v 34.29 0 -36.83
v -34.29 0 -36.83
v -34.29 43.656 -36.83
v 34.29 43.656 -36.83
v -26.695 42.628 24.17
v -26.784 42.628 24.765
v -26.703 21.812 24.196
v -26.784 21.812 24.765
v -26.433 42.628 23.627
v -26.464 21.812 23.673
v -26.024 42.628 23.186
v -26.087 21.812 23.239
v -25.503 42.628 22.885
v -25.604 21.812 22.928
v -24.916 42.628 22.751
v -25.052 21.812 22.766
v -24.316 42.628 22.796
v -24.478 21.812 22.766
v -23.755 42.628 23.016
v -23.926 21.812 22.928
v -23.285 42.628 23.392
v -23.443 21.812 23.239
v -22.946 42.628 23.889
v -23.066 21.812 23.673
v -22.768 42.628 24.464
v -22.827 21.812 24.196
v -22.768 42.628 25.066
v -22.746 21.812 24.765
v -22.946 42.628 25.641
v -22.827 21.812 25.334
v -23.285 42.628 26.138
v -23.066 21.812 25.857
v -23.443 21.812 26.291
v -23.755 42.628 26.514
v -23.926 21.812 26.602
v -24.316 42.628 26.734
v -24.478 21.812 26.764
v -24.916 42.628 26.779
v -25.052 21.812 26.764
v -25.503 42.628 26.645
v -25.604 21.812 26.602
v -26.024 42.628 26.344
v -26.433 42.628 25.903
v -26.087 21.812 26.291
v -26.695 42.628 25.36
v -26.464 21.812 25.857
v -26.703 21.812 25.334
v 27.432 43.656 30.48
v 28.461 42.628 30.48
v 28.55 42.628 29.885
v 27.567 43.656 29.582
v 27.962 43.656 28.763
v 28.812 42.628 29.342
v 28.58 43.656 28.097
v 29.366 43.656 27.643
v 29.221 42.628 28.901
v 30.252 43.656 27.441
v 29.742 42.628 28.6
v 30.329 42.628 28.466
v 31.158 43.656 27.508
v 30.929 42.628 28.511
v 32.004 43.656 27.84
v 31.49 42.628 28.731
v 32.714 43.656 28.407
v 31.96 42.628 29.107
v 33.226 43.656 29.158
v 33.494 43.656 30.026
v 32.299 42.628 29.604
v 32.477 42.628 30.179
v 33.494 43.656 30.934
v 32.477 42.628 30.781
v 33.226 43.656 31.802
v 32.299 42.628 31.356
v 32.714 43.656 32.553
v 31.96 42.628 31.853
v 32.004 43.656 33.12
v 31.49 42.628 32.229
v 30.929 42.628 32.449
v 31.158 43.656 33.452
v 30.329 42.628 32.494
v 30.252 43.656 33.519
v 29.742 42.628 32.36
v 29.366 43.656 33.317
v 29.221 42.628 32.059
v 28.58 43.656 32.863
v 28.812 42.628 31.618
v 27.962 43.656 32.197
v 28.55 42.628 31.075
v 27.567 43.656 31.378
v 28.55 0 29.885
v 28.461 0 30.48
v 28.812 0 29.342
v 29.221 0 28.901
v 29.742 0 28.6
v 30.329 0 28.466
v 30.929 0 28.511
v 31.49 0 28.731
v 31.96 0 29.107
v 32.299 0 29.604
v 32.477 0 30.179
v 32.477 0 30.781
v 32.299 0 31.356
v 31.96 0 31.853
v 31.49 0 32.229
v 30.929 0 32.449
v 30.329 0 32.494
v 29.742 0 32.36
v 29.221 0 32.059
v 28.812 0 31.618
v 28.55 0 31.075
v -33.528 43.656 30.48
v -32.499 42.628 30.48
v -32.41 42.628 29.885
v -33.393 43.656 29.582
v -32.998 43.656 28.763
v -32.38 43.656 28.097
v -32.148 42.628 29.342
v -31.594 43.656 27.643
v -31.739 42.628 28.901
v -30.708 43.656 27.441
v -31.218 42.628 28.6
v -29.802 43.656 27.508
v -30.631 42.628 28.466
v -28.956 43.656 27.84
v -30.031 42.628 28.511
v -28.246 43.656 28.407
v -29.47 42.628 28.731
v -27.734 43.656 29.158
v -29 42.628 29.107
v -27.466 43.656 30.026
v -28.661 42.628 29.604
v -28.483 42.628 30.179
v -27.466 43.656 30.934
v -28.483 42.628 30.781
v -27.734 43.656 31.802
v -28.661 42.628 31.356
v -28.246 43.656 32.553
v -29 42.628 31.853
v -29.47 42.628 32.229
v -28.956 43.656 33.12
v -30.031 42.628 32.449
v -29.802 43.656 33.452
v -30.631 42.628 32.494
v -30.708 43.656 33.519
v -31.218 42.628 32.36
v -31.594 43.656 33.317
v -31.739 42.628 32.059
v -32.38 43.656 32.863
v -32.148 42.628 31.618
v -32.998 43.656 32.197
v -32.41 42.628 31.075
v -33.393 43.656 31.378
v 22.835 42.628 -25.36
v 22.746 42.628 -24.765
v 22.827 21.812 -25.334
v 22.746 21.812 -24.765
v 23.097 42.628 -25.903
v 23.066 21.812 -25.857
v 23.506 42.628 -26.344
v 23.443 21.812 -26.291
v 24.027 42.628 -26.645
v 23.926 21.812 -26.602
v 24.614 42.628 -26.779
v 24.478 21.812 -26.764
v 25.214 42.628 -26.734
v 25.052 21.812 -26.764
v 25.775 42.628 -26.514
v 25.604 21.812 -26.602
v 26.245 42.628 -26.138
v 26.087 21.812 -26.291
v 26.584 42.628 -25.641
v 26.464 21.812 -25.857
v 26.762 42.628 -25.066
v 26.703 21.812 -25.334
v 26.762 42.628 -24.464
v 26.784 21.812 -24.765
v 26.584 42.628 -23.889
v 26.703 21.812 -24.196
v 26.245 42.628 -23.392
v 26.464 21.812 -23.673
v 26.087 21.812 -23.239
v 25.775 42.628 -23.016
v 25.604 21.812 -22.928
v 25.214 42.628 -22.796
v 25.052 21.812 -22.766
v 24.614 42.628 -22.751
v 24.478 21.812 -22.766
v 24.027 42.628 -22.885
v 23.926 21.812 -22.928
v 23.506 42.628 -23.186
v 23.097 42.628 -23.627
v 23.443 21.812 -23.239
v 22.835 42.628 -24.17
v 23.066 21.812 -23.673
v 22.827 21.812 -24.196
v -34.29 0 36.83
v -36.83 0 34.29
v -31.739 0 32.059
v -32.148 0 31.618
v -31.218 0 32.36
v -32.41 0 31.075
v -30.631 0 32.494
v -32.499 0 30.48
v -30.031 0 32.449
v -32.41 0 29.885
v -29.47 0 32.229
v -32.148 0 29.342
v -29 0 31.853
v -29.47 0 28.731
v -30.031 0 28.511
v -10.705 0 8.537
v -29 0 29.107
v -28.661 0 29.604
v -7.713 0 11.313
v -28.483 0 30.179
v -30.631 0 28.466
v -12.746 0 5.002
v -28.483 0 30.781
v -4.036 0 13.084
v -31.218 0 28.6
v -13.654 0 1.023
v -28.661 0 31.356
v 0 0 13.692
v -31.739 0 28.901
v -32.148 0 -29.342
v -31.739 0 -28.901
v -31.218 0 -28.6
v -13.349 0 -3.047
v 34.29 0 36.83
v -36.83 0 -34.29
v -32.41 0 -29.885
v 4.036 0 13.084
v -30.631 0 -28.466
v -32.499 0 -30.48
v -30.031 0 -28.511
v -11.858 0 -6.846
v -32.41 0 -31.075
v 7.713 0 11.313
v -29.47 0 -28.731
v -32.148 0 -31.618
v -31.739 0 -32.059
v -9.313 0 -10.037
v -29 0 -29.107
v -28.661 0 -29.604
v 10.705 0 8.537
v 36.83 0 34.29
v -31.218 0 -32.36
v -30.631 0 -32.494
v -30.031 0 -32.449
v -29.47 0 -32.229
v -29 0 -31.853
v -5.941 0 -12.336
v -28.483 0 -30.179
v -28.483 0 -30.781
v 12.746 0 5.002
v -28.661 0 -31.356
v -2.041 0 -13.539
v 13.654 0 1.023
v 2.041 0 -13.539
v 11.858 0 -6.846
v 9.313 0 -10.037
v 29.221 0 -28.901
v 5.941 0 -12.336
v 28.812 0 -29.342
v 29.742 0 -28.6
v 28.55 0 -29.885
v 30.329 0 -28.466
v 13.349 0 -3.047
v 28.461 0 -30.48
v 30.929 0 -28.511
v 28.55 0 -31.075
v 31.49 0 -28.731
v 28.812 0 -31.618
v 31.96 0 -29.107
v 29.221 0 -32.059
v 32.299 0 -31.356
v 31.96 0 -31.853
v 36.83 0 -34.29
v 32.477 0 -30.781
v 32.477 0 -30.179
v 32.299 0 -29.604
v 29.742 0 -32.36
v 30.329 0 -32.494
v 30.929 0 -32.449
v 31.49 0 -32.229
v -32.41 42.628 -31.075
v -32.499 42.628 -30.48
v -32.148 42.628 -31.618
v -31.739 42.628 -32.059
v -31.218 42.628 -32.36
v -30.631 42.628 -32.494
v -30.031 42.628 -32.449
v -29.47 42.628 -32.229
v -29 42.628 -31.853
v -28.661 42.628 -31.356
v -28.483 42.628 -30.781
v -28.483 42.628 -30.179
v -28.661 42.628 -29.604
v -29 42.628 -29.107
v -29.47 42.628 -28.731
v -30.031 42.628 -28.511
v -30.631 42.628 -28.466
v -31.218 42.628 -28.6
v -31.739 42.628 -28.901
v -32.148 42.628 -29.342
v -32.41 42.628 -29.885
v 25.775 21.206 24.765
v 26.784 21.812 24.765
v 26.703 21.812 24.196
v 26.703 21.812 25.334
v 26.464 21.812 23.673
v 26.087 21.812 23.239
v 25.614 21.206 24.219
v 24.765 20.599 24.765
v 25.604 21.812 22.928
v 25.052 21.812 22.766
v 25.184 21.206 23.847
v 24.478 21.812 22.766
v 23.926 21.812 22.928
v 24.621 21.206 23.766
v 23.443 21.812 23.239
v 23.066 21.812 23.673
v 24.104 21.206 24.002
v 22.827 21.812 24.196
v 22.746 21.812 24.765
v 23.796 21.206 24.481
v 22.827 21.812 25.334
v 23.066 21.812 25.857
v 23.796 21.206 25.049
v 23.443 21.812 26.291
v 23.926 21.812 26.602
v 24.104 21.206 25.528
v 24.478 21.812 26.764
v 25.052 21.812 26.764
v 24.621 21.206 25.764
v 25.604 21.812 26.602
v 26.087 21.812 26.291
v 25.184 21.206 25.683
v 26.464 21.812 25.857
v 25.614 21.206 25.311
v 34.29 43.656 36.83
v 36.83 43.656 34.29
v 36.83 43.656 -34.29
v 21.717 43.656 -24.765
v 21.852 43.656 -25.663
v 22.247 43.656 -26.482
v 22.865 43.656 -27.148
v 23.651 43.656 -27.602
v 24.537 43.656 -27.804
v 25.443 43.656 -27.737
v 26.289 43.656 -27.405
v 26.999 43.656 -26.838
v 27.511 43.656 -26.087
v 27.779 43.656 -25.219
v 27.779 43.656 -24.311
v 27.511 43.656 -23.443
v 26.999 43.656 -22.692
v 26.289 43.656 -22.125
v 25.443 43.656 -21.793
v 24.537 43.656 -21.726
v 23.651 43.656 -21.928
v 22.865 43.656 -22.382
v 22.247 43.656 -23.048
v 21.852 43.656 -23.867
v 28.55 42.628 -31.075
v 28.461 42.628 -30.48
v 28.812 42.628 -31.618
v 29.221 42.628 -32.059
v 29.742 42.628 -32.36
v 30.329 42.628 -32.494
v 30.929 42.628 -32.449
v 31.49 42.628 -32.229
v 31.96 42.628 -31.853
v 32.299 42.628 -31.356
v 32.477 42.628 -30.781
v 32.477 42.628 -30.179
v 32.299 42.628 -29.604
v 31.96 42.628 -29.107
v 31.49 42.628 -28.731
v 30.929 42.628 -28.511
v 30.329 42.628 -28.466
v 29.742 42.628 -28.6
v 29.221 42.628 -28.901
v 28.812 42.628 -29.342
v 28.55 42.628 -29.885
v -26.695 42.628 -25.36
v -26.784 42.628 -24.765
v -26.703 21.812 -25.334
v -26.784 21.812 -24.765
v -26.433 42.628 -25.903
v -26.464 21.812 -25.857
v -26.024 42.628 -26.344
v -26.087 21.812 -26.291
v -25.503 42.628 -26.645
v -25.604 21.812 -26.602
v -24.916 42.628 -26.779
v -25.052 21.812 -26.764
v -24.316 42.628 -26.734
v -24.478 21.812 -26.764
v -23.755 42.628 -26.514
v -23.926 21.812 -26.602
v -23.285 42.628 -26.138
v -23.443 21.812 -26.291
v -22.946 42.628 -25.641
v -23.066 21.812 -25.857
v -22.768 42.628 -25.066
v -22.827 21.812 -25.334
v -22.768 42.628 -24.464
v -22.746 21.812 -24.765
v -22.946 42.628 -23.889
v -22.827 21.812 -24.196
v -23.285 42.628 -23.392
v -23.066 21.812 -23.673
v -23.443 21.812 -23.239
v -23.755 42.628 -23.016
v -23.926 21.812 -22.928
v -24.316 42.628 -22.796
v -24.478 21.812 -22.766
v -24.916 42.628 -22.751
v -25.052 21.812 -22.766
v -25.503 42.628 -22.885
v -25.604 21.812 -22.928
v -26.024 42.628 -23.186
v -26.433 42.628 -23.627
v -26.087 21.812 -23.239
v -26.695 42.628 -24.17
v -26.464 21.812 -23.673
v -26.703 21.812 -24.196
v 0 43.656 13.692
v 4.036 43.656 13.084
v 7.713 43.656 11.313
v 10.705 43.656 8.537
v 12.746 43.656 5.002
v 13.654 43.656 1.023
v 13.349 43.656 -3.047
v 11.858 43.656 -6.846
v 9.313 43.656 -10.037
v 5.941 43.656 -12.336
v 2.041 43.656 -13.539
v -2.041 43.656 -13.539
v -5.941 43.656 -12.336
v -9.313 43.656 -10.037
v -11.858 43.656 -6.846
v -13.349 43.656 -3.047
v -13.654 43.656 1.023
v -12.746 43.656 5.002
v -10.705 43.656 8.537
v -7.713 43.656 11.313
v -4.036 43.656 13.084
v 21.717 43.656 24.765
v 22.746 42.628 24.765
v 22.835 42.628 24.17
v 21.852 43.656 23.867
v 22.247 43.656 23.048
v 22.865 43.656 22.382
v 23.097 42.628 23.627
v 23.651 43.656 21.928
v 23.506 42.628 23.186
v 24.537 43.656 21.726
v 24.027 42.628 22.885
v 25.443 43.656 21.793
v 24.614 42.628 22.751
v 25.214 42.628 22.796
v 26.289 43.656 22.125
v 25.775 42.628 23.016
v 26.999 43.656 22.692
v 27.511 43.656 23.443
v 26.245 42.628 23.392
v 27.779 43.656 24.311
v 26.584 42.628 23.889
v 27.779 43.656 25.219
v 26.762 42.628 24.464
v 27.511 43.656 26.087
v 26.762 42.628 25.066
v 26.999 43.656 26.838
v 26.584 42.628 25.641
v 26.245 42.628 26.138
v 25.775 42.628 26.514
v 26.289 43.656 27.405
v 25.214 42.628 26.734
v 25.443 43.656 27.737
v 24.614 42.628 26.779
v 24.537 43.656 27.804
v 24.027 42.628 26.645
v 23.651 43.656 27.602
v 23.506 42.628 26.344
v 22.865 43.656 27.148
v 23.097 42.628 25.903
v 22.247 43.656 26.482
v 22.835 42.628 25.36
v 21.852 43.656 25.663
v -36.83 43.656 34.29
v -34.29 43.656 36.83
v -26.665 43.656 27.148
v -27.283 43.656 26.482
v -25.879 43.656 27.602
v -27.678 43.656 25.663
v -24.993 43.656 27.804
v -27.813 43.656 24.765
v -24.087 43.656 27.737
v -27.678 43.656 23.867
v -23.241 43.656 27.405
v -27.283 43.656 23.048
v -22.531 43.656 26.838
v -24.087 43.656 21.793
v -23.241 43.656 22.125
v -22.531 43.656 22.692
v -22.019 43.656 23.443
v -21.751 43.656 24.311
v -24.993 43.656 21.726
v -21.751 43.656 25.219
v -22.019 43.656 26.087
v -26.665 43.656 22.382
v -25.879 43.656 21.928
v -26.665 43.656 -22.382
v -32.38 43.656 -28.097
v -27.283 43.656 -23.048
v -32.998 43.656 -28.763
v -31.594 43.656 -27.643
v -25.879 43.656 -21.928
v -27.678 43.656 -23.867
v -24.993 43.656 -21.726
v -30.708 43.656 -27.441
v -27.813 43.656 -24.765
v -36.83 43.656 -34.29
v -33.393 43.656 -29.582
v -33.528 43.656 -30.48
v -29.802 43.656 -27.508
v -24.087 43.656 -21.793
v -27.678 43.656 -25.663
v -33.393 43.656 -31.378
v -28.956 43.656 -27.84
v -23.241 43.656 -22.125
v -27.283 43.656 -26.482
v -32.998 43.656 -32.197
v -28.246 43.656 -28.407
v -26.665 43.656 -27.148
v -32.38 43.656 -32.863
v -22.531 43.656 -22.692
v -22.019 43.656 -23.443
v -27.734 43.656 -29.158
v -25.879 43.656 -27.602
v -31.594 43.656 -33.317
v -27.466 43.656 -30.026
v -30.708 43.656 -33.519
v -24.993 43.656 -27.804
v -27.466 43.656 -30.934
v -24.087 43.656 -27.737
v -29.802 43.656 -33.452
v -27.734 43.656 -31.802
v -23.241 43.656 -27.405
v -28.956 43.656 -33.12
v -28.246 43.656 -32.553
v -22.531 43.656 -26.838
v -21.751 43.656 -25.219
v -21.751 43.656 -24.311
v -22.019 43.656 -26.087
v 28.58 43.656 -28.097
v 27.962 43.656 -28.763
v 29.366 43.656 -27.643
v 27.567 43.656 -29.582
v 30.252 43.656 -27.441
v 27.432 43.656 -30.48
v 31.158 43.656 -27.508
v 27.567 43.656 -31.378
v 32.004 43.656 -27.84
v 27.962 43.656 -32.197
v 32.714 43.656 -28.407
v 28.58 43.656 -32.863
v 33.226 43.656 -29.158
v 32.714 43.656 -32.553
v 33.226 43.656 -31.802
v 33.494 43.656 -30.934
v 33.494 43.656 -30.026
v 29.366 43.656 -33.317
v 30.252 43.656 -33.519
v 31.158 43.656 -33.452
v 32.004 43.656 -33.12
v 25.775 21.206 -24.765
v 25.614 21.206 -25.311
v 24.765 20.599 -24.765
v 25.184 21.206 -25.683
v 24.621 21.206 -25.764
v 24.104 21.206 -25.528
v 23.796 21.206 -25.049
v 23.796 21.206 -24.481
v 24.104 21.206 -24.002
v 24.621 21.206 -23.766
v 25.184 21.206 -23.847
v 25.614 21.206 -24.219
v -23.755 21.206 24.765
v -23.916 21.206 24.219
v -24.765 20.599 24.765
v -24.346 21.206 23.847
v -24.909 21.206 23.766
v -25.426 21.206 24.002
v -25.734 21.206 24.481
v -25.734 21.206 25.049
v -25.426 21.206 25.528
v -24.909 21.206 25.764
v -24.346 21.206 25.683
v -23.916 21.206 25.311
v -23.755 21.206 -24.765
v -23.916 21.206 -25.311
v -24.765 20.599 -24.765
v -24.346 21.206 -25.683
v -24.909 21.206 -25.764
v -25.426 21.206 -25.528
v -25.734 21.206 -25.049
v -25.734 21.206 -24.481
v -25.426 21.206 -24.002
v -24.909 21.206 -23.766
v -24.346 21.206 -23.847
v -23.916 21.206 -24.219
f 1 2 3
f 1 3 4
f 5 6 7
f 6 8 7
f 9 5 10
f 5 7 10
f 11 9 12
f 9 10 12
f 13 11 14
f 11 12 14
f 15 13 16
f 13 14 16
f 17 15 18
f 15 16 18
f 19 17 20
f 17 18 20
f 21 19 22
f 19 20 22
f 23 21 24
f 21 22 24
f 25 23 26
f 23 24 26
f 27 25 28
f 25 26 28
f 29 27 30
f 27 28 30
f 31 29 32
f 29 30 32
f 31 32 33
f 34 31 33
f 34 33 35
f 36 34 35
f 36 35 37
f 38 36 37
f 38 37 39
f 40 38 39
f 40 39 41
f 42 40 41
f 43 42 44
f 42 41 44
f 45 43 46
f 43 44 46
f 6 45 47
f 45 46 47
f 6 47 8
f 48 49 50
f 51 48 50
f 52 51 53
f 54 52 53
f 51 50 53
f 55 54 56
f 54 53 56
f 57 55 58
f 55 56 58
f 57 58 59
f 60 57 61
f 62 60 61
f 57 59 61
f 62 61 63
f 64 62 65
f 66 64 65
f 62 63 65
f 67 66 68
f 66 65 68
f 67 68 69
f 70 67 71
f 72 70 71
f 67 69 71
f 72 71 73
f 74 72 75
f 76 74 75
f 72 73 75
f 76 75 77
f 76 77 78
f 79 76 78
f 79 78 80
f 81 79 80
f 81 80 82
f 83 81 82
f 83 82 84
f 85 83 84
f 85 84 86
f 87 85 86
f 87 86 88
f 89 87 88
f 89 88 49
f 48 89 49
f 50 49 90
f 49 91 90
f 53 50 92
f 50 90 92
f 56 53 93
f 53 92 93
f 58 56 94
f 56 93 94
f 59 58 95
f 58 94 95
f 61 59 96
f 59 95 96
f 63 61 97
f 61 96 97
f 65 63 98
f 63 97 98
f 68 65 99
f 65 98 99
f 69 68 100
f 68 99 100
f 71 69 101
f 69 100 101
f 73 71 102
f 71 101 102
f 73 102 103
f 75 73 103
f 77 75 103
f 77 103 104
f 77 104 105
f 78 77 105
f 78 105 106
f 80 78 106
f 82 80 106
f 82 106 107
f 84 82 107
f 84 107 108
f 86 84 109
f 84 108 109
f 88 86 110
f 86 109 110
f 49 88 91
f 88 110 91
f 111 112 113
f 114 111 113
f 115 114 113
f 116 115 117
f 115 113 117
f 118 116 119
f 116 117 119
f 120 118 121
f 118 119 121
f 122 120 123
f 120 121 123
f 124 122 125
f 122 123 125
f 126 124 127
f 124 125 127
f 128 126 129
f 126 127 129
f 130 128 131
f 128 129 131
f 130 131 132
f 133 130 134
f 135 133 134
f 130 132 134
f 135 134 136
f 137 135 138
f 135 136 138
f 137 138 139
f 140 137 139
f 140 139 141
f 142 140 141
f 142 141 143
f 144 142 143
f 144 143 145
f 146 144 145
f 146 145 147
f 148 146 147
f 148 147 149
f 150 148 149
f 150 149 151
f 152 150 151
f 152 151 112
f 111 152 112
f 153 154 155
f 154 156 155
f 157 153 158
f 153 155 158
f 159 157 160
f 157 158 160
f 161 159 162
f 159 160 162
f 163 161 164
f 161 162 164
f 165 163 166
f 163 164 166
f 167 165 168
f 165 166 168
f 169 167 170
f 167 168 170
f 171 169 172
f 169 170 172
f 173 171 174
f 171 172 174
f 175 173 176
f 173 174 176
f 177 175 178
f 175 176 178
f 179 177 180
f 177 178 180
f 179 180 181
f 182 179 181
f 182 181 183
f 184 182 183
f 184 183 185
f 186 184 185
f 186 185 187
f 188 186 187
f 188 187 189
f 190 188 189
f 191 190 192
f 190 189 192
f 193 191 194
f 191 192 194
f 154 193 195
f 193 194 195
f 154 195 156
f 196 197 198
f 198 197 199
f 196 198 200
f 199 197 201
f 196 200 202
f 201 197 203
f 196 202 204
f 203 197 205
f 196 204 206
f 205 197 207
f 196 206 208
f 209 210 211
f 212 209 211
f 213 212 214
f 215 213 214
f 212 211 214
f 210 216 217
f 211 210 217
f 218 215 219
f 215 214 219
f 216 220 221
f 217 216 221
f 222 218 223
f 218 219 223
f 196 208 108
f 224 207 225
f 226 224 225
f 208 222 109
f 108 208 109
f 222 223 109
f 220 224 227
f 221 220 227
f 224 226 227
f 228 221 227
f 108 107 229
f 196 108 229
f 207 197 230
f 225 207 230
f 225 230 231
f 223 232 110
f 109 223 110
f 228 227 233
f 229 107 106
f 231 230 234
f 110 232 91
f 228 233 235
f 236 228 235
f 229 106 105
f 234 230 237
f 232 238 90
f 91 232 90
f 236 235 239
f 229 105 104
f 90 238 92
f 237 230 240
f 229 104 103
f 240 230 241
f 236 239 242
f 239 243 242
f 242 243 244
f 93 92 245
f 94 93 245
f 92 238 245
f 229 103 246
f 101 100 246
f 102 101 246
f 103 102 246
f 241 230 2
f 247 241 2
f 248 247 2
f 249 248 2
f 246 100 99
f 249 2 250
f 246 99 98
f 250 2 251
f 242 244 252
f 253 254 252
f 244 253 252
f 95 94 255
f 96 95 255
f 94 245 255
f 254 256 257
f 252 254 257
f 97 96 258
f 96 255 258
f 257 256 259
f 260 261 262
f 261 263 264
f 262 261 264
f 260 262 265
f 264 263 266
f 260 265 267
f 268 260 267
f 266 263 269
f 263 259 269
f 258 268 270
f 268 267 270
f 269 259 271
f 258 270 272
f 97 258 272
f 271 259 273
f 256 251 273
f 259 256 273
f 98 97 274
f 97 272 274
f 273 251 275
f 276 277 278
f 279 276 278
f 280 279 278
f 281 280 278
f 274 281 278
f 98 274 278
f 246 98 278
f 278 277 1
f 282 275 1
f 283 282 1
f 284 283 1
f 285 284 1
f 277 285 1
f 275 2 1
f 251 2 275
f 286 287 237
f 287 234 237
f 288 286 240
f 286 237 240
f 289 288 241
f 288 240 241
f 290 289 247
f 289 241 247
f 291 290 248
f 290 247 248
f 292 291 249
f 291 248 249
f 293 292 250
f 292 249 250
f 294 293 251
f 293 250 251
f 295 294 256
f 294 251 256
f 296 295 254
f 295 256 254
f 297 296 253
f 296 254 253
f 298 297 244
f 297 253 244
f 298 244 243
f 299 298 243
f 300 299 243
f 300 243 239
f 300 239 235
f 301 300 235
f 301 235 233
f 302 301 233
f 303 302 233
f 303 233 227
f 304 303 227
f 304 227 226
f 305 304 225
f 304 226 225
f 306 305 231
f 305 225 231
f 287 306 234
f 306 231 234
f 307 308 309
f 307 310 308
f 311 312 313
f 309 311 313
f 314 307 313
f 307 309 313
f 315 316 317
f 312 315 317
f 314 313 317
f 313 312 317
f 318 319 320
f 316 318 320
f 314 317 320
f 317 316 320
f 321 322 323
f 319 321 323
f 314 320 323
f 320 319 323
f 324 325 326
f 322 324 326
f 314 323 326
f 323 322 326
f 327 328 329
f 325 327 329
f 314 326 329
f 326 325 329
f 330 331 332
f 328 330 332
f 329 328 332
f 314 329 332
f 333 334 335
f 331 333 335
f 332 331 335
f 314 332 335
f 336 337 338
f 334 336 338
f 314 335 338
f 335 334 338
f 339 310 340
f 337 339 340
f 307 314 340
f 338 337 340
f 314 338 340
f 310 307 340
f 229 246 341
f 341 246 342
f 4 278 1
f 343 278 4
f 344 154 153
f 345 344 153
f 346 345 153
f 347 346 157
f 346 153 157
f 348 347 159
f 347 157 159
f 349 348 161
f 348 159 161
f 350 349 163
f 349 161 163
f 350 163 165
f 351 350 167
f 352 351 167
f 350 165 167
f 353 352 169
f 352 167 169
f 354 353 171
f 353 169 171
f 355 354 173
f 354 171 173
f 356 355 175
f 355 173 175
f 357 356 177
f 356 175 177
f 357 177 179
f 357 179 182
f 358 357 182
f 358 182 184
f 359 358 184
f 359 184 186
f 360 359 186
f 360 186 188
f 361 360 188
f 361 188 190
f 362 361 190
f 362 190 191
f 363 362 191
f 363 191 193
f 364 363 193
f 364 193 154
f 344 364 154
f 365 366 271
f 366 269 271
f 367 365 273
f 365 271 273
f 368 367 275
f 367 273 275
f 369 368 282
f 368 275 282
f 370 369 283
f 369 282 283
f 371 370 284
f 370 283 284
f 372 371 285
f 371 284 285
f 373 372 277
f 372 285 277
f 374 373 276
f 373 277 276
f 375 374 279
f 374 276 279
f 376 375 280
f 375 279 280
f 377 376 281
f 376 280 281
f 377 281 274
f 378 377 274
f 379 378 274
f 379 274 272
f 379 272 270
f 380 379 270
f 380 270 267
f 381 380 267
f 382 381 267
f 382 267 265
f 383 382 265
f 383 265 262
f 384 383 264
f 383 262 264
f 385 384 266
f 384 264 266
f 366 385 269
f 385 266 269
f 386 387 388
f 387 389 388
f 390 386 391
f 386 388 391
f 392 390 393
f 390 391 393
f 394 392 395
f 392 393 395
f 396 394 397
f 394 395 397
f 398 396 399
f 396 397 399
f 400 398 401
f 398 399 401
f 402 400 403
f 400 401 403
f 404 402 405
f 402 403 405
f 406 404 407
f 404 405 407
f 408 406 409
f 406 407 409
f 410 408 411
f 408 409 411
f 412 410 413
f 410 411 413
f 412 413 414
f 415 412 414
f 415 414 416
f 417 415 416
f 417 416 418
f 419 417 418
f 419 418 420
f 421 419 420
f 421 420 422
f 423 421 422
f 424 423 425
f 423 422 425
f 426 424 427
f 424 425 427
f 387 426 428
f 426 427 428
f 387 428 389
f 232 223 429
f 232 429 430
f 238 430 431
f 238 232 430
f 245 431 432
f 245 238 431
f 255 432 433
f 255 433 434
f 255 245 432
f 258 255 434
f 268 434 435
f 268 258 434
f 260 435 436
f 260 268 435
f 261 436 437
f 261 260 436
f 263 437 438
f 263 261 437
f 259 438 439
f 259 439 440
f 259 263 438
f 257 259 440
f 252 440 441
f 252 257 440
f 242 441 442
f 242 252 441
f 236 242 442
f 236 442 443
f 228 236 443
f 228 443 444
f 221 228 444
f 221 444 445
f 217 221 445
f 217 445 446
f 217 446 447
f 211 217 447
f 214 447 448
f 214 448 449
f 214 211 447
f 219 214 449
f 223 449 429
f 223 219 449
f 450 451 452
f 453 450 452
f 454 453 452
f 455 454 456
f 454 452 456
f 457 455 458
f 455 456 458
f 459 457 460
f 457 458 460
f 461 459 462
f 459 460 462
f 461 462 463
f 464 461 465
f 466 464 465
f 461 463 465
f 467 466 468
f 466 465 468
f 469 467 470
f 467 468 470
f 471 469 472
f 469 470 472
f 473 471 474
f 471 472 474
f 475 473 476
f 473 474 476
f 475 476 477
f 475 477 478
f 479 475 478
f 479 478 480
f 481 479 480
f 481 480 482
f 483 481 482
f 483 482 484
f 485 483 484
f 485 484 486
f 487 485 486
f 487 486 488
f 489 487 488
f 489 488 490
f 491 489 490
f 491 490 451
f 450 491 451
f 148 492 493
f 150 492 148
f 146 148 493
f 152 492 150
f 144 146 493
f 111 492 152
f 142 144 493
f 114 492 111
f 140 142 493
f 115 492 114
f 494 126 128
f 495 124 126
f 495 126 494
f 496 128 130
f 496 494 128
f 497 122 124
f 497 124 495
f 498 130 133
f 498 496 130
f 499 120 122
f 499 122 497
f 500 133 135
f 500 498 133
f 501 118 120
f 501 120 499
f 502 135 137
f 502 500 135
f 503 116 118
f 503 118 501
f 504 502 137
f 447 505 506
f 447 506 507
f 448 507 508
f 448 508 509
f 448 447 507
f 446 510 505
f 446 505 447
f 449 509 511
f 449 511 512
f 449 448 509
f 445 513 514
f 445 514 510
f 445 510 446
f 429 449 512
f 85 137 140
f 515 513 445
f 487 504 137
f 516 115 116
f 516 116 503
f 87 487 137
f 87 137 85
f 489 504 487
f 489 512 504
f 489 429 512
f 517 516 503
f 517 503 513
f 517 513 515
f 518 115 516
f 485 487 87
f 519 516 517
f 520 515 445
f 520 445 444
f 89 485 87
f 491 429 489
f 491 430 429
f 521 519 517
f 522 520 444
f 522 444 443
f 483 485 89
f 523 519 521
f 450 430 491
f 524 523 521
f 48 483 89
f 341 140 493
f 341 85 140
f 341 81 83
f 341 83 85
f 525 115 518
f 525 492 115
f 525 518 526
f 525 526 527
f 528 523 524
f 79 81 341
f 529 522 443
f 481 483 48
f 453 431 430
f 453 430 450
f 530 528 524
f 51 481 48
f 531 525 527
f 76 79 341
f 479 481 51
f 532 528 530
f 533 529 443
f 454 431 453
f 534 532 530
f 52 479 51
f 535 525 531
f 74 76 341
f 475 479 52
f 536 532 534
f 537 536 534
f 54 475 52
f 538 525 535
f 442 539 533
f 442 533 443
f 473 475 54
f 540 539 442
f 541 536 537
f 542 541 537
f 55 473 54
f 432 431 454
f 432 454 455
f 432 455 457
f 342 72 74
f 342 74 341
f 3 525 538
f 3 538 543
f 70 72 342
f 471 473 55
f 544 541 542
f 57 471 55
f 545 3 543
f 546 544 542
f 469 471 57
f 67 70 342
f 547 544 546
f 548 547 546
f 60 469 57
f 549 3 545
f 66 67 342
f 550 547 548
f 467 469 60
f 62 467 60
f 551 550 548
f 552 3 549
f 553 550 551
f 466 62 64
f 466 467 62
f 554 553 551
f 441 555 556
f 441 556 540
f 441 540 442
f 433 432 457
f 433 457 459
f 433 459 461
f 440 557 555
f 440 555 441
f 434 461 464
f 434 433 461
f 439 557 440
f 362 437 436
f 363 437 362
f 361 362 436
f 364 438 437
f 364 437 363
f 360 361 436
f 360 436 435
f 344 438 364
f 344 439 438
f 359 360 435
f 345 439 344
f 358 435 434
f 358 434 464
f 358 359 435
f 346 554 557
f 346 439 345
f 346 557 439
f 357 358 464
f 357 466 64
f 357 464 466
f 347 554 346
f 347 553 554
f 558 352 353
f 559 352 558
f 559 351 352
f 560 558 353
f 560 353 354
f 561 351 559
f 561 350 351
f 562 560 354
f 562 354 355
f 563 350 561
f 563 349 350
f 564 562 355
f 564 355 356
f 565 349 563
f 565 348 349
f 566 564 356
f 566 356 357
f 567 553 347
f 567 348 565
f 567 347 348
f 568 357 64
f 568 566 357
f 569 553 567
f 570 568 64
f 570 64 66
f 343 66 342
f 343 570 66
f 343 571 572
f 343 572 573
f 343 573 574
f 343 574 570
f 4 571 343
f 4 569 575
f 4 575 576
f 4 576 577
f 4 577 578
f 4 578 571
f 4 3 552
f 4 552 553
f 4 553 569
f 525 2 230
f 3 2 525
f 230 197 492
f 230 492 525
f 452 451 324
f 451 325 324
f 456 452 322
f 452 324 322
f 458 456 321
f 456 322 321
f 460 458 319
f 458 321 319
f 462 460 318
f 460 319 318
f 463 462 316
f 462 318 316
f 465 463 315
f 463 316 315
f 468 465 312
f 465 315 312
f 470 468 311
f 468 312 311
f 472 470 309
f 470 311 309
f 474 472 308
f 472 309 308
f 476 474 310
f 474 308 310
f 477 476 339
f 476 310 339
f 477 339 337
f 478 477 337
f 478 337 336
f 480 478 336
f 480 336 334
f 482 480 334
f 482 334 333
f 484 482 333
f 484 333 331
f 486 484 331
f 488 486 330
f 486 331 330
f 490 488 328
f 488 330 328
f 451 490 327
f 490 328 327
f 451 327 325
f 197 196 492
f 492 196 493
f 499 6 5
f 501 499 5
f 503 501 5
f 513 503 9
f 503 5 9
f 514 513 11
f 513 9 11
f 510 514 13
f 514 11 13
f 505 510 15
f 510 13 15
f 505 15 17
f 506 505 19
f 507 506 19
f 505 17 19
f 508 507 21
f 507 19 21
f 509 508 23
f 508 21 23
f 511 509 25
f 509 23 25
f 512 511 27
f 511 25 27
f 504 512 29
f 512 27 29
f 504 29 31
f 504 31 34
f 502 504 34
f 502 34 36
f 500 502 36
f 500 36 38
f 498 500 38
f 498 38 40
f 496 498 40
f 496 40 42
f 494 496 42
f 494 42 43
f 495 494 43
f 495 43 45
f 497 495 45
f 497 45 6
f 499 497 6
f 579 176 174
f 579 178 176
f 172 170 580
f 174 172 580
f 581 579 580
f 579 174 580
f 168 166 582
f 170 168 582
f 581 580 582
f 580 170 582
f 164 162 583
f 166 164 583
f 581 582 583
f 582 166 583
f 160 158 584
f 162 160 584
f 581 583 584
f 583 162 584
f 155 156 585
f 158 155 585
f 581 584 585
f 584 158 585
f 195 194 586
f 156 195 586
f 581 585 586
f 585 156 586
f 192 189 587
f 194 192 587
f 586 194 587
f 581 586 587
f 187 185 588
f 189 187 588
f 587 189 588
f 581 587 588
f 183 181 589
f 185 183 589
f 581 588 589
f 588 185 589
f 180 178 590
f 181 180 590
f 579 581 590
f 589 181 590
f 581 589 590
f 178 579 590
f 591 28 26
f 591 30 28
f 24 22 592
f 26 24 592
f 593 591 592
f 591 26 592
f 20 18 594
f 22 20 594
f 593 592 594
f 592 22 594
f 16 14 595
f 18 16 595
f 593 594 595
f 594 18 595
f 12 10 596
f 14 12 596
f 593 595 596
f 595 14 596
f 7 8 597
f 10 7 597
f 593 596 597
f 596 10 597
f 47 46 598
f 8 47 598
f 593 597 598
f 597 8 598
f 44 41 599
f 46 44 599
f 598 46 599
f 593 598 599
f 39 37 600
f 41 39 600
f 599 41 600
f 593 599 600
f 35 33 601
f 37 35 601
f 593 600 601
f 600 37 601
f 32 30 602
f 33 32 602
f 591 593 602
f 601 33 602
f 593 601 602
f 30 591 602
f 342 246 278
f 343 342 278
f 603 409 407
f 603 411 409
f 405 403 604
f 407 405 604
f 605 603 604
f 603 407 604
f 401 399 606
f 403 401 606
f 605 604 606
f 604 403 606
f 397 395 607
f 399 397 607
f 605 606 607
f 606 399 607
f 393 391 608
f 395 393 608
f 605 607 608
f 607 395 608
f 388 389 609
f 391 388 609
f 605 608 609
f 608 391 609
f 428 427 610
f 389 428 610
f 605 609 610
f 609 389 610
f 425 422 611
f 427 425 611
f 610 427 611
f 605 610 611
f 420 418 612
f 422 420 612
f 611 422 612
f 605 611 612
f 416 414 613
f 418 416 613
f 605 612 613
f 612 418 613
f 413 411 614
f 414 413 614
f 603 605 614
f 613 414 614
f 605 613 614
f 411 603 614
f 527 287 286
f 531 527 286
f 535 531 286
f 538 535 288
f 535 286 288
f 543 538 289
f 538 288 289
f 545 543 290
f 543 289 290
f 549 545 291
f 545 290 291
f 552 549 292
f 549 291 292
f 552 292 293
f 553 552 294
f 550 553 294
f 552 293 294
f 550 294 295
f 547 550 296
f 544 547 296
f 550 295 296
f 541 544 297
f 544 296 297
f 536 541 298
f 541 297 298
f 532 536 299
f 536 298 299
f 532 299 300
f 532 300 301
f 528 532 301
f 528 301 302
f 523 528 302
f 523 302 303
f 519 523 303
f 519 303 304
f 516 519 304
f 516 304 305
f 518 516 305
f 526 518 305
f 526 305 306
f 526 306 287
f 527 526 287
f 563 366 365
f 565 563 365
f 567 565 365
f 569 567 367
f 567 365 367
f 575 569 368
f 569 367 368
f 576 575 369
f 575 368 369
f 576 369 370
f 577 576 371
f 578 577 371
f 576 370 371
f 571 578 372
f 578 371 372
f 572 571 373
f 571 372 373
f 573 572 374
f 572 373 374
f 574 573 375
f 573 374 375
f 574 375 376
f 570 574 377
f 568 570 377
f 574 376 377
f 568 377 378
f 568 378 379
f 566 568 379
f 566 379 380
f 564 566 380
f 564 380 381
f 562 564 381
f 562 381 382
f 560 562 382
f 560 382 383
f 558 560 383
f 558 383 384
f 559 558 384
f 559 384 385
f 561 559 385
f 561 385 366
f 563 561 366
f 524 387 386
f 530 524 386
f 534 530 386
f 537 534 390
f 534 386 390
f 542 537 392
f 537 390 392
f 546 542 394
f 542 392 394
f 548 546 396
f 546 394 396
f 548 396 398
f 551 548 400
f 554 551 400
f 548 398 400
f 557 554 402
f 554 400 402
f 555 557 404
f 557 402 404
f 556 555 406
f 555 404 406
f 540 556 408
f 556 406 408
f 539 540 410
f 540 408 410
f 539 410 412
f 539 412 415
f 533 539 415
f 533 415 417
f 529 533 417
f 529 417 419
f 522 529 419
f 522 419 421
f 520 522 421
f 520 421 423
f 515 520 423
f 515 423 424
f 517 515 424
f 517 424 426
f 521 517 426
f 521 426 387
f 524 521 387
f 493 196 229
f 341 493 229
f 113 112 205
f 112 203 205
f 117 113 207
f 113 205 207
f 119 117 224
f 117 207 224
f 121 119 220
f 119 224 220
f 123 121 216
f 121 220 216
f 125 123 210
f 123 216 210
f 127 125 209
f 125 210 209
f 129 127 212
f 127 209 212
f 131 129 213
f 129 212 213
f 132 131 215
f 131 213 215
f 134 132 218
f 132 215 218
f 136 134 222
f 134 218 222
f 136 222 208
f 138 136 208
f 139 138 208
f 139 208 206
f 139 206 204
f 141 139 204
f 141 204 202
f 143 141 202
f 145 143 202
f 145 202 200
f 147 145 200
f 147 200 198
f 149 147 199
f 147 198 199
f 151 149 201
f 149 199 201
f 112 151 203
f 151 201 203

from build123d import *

# Parameters (mm, degrees)
SKETCH1_W                        = 73.66
SKETCH1_H                        = 73.66
SKETCH1_R                        = 13.6921875
BOSS_EXTRUDE1_DEPTH              = 43.65625
CHAMFER2_SIZE                    = 2.54
F_10_32_TAPPED_HOLE1_D           = 4.0386
F_10_32_TAPPED_HOLE1_CSINK_D     = 6.096
F_10_32_TAPPED_HOLE1_CSINK_ANGLE = 90
F_10_32_TAPPED_HOLE2_D           = 4.0386
F_10_32_TAPPED_HOLE2_DEPTH       = 21.844
F_10_32_TAPPED_HOLE2_CSINK_D     = 6.096
F_10_32_TAPPED_HOLE2_CSINK_ANGLE = 90
F_10_32_TAPPED_HOLE2_TIP         = 1.213317848


with BuildPart() as part:
    # Sketch1 → Boss-Extrude1 (new body)
    with BuildSketch(Plane(origin=(0, 0, 0), x_dir=(1, 0, 0), z_dir=(0, 1, 0))):
        Rectangle(SKETCH1_W, SKETCH1_H)
        with Locations(Location((0, 0, 0), (0, 0, 270))):
            Circle(SKETCH1_R, mode=Mode.SUBTRACT)
    extrude(amount=BOSS_EXTRUDE1_DEPTH)

    # Chamfer2
    chamfer2_edges = [part.edges().sort_by_distance(p)[0] for p in [
        (-36.83, 21.828125, -36.83),
        (36.83, 21.828125, -36.83),
        (36.83, 21.828125, 36.83),
        (-36.83, 21.828125, 36.83),
    ]]
    chamfer(chamfer2_edges, length=CHAMFER2_SIZE)

    # #10-32 Tapped Hole1 (through all)
    with Locations(Plane(origin=(0, 43.65625, 0), x_dir=(1, 0, 0), z_dir=(0, 1, 0))):
        with Locations((30.48, 30.48), (-30.48, 30.48), (-30.48, -30.48), (30.48, -30.48)):
            CounterSinkHole(F_10_32_TAPPED_HOLE1_D / 2, F_10_32_TAPPED_HOLE1_CSINK_D / 2, counter_sink_angle=F_10_32_TAPPED_HOLE1_CSINK_ANGLE)

    # #10-32 Tapped Hole2
    with Locations(Plane(origin=(0, 43.65625, 0), x_dir=(1, 0, 0), z_dir=(0, 1, 0))):
        with Locations((-24.765, 24.765), (24.765, 24.765), (-24.765, -24.765), (24.765, -24.765)):
            CounterSinkHole(F_10_32_TAPPED_HOLE2_D / 2, F_10_32_TAPPED_HOLE2_CSINK_D / 2, depth=F_10_32_TAPPED_HOLE2_DEPTH, counter_sink_angle=F_10_32_TAPPED_HOLE2_CSINK_ANGLE)
            with Locations((0, 0, -(F_10_32_TAPPED_HOLE2_DEPTH + F_10_32_TAPPED_HOLE2_TIP / 2))):  # 118° drill point
                Cone(0, F_10_32_TAPPED_HOLE2_D / 2, F_10_32_TAPPED_HOLE2_TIP, mode=Mode.SUBTRACT)


solid = part.part
